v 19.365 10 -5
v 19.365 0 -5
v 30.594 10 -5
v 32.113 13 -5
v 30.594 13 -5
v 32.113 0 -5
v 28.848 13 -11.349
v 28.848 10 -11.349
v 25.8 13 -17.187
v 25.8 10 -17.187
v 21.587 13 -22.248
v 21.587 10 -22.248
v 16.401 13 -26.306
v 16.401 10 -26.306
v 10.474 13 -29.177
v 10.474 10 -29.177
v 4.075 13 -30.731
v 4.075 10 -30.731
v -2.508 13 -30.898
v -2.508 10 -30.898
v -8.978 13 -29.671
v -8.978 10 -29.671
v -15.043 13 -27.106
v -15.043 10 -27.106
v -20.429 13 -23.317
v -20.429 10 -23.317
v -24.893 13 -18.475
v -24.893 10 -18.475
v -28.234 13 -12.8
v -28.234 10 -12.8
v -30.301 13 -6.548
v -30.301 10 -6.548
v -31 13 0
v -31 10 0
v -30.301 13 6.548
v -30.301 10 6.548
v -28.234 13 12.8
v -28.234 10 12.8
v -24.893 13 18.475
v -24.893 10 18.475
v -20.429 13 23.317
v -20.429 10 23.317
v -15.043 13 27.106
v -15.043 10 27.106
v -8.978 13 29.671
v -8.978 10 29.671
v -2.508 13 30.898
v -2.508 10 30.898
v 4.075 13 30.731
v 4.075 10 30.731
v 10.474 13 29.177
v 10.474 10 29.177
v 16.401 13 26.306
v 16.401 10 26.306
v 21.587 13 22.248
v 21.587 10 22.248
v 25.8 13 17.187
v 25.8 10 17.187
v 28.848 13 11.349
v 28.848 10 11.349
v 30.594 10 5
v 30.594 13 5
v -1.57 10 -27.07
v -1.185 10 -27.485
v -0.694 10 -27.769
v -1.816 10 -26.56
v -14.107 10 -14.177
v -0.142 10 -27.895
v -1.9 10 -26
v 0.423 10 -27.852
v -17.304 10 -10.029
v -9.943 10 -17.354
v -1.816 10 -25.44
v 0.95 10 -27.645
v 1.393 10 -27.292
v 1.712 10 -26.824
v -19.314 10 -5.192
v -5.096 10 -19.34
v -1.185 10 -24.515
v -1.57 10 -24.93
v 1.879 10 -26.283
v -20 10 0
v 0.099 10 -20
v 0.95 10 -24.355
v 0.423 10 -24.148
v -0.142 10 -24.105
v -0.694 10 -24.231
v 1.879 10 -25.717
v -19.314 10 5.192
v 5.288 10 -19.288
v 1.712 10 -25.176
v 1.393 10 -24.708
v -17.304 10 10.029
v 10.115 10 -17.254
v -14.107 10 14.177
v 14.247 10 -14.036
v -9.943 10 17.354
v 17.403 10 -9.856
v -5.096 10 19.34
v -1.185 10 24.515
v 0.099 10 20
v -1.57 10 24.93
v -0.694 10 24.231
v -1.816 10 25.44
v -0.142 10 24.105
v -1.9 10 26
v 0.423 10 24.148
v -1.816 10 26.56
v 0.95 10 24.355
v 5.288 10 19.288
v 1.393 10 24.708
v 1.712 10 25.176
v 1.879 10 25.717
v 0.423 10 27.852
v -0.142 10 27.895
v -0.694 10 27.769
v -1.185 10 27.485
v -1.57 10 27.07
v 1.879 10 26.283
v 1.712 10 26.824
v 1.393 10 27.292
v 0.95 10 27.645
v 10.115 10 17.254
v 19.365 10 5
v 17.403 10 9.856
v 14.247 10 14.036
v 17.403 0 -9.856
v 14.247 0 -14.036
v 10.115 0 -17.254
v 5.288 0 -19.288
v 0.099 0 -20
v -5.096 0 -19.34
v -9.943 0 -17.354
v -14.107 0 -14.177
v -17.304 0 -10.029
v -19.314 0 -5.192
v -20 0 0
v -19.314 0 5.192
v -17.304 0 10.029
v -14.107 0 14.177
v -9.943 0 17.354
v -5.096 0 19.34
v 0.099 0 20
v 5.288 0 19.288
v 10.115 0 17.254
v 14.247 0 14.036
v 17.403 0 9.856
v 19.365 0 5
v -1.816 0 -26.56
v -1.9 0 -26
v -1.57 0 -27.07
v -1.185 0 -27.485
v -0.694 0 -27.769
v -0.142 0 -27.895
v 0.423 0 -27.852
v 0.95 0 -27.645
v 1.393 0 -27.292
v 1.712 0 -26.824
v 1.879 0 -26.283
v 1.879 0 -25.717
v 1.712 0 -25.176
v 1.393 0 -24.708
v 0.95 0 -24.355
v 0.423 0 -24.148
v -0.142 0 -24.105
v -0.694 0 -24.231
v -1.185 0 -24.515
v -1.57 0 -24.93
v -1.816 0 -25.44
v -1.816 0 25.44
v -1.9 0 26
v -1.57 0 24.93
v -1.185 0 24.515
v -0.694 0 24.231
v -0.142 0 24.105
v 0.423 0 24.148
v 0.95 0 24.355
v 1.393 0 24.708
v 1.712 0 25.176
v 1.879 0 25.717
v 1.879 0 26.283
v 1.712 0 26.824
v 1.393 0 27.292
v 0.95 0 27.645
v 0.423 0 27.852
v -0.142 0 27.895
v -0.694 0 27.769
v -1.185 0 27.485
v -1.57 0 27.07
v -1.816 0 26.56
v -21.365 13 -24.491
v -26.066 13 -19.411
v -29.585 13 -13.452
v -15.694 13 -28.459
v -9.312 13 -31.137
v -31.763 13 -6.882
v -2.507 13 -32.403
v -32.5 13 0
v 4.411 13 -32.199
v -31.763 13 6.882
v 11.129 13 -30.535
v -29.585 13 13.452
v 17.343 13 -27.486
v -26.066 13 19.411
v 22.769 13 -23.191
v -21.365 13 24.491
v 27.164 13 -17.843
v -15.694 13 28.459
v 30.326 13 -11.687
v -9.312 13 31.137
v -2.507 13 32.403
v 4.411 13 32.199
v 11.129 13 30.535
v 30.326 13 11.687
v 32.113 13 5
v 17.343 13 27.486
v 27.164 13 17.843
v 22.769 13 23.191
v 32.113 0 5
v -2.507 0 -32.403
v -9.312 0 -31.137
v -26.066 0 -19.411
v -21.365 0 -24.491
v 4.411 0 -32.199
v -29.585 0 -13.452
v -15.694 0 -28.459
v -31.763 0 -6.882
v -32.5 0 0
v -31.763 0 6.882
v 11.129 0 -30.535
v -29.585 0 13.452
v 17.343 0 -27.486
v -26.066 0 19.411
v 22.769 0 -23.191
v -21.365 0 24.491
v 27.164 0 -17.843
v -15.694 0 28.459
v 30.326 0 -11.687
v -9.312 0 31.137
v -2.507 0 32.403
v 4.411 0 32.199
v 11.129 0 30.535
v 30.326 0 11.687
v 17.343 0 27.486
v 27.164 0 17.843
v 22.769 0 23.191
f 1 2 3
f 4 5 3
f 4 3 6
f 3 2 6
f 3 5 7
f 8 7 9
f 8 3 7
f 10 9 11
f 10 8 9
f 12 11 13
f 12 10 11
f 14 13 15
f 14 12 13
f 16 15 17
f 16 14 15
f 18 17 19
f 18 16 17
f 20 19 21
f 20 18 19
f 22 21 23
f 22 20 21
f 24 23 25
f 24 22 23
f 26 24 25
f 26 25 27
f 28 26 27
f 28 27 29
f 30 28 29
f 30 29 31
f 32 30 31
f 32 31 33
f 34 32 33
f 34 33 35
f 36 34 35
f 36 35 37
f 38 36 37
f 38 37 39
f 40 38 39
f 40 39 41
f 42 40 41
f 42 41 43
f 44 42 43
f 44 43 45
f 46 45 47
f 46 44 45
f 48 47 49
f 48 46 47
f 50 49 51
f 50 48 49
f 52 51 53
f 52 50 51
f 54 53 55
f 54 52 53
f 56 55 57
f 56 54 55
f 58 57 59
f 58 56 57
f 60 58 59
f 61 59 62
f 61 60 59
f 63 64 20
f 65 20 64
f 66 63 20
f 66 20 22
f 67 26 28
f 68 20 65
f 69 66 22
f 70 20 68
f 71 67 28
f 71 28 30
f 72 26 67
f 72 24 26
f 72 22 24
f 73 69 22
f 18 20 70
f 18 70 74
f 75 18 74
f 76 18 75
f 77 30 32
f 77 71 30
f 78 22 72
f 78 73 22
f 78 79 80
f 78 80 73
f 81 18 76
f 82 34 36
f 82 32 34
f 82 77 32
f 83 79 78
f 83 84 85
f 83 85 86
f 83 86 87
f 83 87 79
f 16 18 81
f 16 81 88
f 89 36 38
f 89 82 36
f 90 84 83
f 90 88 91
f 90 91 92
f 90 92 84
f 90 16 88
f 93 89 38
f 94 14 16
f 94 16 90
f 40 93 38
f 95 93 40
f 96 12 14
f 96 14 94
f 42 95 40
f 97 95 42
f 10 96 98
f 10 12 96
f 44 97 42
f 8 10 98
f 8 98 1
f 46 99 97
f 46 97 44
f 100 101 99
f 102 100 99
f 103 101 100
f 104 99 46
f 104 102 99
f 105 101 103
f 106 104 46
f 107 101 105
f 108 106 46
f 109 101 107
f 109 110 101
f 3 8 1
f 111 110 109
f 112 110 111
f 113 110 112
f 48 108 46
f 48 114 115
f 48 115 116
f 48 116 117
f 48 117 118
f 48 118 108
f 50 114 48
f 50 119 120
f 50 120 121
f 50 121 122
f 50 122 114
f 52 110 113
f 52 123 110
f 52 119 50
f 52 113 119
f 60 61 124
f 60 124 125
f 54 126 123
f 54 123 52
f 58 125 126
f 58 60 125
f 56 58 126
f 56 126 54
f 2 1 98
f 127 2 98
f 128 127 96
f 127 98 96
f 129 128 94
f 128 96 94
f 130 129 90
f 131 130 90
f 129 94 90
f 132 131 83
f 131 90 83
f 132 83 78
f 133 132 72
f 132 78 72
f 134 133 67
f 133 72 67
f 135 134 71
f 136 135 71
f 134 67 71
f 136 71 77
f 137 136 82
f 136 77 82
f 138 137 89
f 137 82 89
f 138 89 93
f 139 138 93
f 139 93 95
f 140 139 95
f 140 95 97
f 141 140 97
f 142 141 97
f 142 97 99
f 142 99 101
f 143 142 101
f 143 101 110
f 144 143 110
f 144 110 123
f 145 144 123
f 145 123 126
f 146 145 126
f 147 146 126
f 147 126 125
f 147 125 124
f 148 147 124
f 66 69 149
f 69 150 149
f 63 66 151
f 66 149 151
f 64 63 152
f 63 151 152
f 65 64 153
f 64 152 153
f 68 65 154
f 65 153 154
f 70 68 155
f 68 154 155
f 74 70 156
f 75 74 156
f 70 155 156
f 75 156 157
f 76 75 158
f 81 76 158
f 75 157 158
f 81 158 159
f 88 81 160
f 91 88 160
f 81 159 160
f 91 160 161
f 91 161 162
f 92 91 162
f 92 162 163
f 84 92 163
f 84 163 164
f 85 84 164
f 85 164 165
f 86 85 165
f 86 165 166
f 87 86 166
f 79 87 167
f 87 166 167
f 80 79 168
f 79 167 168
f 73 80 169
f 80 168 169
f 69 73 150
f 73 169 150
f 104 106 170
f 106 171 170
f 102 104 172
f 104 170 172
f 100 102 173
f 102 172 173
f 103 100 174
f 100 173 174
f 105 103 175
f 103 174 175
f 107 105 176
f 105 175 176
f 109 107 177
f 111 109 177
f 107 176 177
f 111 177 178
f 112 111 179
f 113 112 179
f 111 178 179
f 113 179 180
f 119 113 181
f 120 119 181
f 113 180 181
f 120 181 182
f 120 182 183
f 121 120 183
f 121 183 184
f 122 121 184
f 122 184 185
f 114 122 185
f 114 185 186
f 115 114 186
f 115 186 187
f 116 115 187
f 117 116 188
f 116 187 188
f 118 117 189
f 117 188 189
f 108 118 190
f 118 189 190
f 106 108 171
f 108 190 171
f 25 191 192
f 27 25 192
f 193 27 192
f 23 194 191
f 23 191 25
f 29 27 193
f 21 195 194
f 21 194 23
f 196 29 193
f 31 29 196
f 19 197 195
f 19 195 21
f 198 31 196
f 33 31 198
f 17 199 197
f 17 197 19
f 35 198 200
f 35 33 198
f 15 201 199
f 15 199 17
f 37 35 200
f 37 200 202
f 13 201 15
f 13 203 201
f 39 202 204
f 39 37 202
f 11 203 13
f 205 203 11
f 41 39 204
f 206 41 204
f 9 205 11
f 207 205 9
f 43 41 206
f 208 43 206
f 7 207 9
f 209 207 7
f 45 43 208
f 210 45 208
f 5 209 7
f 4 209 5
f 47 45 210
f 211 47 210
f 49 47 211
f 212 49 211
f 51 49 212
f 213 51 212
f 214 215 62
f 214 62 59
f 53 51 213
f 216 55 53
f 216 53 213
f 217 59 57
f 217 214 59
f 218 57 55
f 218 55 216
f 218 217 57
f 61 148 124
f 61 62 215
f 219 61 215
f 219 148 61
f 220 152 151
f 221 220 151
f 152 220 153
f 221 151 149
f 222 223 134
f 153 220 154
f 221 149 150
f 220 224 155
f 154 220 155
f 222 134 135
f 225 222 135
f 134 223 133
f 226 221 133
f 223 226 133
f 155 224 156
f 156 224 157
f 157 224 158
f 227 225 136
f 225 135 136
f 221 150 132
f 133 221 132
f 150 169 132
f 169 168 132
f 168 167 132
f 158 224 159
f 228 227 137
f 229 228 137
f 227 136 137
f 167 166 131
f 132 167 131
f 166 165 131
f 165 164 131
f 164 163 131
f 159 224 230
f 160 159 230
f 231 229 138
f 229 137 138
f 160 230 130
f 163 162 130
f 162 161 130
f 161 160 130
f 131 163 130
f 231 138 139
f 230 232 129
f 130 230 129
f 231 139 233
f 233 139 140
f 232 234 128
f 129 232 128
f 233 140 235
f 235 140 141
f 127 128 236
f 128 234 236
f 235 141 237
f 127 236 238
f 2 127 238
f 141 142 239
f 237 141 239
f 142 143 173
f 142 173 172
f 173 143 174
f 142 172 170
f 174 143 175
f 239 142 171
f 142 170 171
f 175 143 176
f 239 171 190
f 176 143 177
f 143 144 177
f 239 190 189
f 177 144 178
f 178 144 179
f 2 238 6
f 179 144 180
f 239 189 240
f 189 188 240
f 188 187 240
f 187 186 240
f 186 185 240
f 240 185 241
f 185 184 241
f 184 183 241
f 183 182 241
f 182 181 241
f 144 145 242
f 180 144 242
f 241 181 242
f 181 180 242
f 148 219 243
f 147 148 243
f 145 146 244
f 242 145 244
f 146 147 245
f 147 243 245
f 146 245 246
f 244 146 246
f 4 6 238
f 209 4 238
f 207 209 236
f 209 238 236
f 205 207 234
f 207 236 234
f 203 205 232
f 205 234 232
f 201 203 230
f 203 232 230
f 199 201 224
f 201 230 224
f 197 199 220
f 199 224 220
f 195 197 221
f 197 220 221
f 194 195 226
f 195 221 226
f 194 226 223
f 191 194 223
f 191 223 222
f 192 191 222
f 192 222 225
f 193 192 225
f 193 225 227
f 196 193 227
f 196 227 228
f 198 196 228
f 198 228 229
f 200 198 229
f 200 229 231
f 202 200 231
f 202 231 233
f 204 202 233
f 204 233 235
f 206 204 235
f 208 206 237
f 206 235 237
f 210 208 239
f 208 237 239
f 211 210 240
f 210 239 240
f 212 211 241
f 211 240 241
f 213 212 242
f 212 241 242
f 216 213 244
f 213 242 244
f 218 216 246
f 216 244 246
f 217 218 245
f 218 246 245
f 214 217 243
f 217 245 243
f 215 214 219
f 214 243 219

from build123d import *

# Parameters (mm, degrees)
SKETCH1_R                      = 32.5
BOSS_EXTRUDE1_DEPTH            = 10
SKETCH2_R                      = 32.5
SKETCH2_R_2                    = 31
BOSS_EXTRUDE2_DEPTH            = 3
CUT_EXTRUDE1_DEPTH             = 3
CUT_EXTRUDE1_DEPTH_BACK        = 48.037219306
SKETCH3_W                      = 39.818487818
SKETCH3_H                      = 10
FILLET1_R                      = 5
F_3_8_3_8_DIAMETER_HOLE1_D     = 3.8
F_3_8_3_8_DIAMETER_HOLE1_DEPTH = 10
F_3_8_3_8_DIAMETER_HOLE1_TIP   = 1.141635176
SKETCH6_R                      = 20
CUT_EXTRUDE2_DEPTH             = 10


with BuildPart() as part:
    # Sketch1 → Boss-Extrude1 (new body)
    with BuildSketch(Plane(origin=(0, 0, 0), x_dir=(1, 0, 0), z_dir=(0, 1, 0))):
        with Locations(Location((0, 0, 0), (0, 0, 270))):
            Circle(SKETCH1_R)
    extrude(amount=BOSS_EXTRUDE1_DEPTH)

    # Sketch2 → Boss-Extrude2 (add)
    with BuildSketch(Plane(origin=(0, 10, 0), x_dir=(1, 0, 0), z_dir=(0, 1, 0))):
        with Locations(Location((0, 0, 0), (0, 0, 270))):
            Circle(SKETCH2_R)
        with Locations(Location((0, 0, 0), (0, 0, 270))):
            Circle(SKETCH2_R_2, mode=Mode.SUBTRACT)
    extrude(amount=BOSS_EXTRUDE2_DEPTH)

    # Sketch3 → Cut-Extrude1 (cut, two sides: drawn at the far end of the back side and taken through both)
    with BuildSketch(Plane(origin=(0, 10, 0), x_dir=(1, 0, 0), z_dir=(0, 1, 0)).offset(-CUT_EXTRUDE1_DEPTH_BACK)):
        with Locations((19.909243909, 0)):
            Rectangle(SKETCH3_W, SKETCH3_H)
    extrude(amount=CUT_EXTRUDE1_DEPTH + CUT_EXTRUDE1_DEPTH_BACK, mode=Mode.SUBTRACT)

    # Fillet1
    fillet1_edges = [part.edges().sort_by_distance(p)[0] for p in [
        (0, 5, 5),
        (0, 5, -5),
    ]]
    fillet(fillet1_edges, radius=FILLET1_R - 0.0001)  # a hair under: the kernel refuses the full size

    # Ø3.8 (3.8) Diameter Hole1
    with Locations(Plane(origin=(0, 10, 0), x_dir=(1, 0, 0), z_dir=(0, 1, 0))):
        with Locations((0, 26), (0, -26)):
            Hole(F_3_8_3_8_DIAMETER_HOLE1_D / 2, depth=F_3_8_3_8_DIAMETER_HOLE1_DEPTH)
            with Locations((0, 0, -(F_3_8_3_8_DIAMETER_HOLE1_DEPTH + F_3_8_3_8_DIAMETER_HOLE1_TIP / 2))):  # 118° drill point
                Cone(0, F_3_8_3_8_DIAMETER_HOLE1_D / 2, F_3_8_3_8_DIAMETER_HOLE1_TIP, mode=Mode.SUBTRACT)

    # Sketch6 → Cut-Extrude2 (cut)
    with BuildSketch(Plane(origin=(0, 10, 0), x_dir=(1, 0, 0), z_dir=(0, 1, 0))):
        Circle(SKETCH6_R)
    extrude(amount=-CUT_EXTRUDE2_DEPTH, mode=Mode.SUBTRACT)


solid = part.part
